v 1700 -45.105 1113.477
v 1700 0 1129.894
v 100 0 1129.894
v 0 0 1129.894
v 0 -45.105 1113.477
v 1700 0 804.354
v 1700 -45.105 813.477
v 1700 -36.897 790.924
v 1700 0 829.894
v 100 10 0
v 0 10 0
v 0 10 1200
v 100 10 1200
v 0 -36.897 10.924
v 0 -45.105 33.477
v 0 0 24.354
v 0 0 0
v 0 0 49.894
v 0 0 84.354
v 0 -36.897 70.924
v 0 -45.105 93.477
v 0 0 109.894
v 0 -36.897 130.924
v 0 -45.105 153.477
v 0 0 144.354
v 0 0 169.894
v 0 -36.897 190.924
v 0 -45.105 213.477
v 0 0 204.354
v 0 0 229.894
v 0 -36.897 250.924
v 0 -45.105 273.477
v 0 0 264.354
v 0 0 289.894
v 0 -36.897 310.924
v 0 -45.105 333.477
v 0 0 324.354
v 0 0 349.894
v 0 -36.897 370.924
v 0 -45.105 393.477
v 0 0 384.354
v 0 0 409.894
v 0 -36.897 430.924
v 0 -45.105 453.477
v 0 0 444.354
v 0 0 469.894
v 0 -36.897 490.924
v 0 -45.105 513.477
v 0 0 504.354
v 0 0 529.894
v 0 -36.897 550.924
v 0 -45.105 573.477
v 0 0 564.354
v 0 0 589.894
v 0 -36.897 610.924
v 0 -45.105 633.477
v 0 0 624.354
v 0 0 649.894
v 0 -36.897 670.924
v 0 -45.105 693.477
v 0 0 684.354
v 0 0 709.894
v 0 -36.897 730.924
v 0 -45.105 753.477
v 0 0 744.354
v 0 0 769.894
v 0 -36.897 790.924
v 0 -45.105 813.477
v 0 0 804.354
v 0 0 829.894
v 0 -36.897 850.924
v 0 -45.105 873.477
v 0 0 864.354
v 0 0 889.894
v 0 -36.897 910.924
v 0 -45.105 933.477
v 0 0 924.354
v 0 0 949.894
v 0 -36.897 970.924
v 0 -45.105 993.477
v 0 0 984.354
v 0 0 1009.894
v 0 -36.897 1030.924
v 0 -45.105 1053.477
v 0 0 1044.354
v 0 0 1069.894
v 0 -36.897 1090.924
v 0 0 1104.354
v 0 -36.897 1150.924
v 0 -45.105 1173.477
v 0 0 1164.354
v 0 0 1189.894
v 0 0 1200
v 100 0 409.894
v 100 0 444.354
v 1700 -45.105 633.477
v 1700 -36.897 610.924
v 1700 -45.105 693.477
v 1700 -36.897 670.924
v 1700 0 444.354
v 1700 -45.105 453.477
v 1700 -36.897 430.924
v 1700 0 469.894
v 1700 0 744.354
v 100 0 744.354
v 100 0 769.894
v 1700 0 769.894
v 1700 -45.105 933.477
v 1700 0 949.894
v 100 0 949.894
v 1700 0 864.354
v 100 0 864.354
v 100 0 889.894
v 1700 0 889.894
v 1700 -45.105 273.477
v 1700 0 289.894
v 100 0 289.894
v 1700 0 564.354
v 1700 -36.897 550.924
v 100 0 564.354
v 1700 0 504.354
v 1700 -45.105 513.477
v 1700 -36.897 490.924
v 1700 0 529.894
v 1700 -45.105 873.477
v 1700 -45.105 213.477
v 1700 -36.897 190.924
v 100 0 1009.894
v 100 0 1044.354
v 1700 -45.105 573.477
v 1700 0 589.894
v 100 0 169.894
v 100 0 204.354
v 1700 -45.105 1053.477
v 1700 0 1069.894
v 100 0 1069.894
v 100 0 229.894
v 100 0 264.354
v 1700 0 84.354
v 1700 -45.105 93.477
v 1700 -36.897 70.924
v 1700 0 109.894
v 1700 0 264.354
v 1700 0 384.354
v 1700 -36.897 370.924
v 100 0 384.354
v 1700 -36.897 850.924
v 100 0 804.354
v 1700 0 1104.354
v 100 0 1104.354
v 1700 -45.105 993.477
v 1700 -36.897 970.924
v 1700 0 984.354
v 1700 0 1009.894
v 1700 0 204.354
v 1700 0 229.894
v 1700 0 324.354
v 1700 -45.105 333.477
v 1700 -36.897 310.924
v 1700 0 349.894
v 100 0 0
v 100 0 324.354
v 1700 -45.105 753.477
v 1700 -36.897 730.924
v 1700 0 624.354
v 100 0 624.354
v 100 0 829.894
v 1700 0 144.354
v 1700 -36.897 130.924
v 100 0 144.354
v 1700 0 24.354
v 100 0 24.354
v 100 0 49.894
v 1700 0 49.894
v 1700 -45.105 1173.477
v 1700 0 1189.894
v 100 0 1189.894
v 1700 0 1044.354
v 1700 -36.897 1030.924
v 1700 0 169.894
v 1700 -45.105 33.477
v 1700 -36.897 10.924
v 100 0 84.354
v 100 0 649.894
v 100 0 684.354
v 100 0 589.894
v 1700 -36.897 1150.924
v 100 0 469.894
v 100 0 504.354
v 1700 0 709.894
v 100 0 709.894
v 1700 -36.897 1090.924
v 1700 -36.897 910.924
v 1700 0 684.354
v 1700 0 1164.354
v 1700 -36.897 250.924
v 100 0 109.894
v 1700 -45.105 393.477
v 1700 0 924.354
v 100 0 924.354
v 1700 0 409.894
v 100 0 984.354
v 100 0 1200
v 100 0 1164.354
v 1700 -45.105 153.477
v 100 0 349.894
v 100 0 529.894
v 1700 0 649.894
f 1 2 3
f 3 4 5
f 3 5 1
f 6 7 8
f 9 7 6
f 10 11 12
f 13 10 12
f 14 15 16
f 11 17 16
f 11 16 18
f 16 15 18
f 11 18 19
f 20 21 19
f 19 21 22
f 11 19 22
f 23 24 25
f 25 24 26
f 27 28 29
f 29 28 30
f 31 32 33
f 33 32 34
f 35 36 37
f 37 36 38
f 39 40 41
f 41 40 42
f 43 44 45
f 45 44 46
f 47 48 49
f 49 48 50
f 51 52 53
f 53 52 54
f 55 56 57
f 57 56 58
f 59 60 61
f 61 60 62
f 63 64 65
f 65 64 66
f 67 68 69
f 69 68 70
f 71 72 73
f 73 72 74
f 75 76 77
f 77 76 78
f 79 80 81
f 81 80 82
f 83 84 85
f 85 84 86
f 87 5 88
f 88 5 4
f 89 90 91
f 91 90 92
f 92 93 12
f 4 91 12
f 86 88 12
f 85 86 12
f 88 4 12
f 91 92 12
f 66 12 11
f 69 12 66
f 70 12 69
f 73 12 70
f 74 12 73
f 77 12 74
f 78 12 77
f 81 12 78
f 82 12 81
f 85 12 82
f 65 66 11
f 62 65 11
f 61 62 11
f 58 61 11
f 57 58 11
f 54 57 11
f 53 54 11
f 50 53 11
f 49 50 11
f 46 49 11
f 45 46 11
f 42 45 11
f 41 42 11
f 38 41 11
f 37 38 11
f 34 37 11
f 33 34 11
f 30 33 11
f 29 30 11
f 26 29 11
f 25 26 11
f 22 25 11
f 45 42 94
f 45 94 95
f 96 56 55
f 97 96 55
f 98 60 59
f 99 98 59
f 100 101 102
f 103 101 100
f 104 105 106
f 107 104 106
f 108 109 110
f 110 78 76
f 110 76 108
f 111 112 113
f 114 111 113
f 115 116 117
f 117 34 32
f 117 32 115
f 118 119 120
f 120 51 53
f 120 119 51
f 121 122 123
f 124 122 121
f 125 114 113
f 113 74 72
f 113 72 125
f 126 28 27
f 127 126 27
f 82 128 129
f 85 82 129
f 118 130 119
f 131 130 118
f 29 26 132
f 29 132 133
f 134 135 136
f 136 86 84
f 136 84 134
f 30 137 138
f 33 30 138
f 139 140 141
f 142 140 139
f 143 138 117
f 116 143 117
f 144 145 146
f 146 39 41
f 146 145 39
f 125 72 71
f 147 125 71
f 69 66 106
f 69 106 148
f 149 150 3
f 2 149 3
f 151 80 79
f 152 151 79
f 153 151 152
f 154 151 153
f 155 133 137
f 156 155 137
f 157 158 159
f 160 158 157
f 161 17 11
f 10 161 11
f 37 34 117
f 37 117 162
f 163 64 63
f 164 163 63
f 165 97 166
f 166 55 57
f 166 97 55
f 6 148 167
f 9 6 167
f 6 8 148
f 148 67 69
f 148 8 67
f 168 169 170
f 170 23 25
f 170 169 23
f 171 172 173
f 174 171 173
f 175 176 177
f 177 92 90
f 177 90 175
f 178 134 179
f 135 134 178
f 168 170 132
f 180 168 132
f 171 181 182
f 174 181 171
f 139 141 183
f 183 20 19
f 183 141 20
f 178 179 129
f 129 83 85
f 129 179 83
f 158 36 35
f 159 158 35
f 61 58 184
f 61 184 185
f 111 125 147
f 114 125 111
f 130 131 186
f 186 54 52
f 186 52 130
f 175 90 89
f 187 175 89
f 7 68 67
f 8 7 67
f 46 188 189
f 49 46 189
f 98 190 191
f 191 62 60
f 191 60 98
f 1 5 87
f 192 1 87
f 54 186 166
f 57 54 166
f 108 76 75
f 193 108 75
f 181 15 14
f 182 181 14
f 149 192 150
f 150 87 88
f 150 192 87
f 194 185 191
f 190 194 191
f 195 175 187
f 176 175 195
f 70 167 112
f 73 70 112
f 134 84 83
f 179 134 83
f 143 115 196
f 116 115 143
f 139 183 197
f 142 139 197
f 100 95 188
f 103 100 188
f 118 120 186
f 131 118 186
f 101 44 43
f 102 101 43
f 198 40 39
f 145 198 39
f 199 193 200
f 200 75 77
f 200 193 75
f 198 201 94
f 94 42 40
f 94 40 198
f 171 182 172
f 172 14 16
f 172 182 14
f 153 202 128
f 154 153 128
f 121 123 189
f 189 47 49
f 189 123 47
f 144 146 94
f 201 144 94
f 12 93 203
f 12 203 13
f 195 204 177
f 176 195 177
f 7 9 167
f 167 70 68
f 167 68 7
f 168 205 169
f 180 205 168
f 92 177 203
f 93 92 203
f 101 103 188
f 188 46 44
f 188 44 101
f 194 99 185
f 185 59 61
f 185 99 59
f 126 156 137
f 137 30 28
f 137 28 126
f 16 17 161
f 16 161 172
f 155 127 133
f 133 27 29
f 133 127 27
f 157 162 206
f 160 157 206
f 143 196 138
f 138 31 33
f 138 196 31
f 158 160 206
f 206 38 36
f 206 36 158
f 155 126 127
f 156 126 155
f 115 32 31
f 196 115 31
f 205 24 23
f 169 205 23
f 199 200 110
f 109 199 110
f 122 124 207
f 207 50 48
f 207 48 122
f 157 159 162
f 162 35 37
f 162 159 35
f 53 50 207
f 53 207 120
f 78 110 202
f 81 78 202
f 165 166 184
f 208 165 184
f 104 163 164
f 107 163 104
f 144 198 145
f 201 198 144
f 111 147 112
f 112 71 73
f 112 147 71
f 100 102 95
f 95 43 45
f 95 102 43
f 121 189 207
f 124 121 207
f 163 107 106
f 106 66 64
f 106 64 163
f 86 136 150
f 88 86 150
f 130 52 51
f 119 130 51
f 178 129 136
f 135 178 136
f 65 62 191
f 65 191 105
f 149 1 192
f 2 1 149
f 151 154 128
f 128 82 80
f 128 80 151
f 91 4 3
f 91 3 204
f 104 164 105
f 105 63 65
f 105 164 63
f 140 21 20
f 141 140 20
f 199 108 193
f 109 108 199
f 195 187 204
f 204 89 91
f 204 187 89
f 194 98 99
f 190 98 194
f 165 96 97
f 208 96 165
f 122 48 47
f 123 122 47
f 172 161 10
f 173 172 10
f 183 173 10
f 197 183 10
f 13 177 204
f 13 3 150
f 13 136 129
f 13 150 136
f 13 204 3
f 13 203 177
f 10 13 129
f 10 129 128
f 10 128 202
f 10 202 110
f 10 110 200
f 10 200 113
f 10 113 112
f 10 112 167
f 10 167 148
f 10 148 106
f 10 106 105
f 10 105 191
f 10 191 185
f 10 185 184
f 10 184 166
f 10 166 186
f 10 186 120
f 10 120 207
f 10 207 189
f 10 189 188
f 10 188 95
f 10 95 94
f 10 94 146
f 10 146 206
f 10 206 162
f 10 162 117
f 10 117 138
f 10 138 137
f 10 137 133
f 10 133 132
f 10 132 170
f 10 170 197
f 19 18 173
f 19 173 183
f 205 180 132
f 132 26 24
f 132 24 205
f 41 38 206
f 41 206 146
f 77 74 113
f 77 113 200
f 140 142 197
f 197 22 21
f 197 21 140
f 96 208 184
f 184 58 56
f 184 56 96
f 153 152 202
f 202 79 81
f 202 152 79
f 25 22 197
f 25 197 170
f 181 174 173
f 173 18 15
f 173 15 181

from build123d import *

# Parameters (mm, degrees)
F0_W     = 10
F0_H     = 1200
F1_DEPTH = 100
F3_DEPTH = 1700


with BuildPart() as f1:
    # F0 (on Right) → F1 (new body)
    with BuildSketch(Plane.YZ):
        with Locations((5, 600)):
            Rectangle(F0_W, F0_H)
    extrude(amount=F1_DEPTH)

    # F2 (on Right) → F3 (join)
    with BuildSketch(Plane.YZ):
        Polygon((0, 24.353822), (0, 49.894088), (-45.105246, 33.477121), (-36.896762, 10.924499), align=None)
        Polygon((-45.105245, 93.47712), (-36.896762, 70.924497), (1e-06, 84.35382), (1e-06, 109.894087), align=None)
        Polygon((-45.105244, 153.477119), (-36.896761, 130.924496), (2e-06, 144.353819), (2e-06, 169.894086), align=None)
        Polygon((-45.105243, 213.477117), (-36.89676, 190.924495), (3e-06, 204.353818), (3e-06, 229.894084), align=None)
        Polygon((-45.105242, 273.477116), (-36.896759, 250.924493), (3e-06, 264.353816), (3e-06, 289.894083), align=None)
        Polygon((-45.105241, 393.477113), (-36.896757, 370.924491), (5e-06, 384.353814), (5e-06, 409.89408), align=None)
        Polygon((-45.10524, 453.477112), (-36.896757, 430.924489), (6e-06, 444.353812), (6e-06, 469.894079), align=None)
        Polygon((-45.105242, 333.477115), (-36.896758, 310.924492), (4e-06, 324.353815), (4e-06, 349.894082), align=None)
        Polygon((-45.105239, 513.477111), (-36.896756, 490.924488), (7e-06, 504.353811), (7e-06, 529.894078), align=None)
        Polygon((-45.105237, 633.477108), (-36.896754, 610.924485), (8e-06, 624.353808), (8e-06, 649.894075), align=None)
        Polygon((-45.105238, 573.477109), (-36.896755, 550.924487), (8e-06, 564.35381), (8e-06, 589.894076), align=None)
        Polygon((-45.105237, 693.477107), (-36.896753, 670.924484), (9e-06, 684.353807), (9e-06, 709.894074), align=None)
        Polygon((-45.105236, 753.477105), (-36.896752, 730.924482), (1e-05, 744.353806), (1e-05, 769.894072), align=None)
        Polygon((-45.105233, 933.477101), (-36.89675, 910.924478), (1.3e-05, 924.353802), (1.3e-05, 949.894068), align=None)
        Polygon((-45.105235, 813.477104), (-36.896752, 790.924481), (1.1e-05, 804.353804), (1.1e-05, 829.894071), align=None)
        Polygon((-45.105234, 873.477103), (-36.896751, 850.92448), (1.2e-05, 864.353803), (1.2e-05, 889.89407), align=None)
        Polygon((-45.10523, 1173.477096), (-36.896747, 1150.924473), (1.6e-05, 1164.353796), (1.6e-05, 1189.894063), align=None)
        Polygon((-45.105231, 1113.477097), (-36.896747, 1090.924474), (1.5e-05, 1104.353798), (1.5e-05, 1129.894064), align=None)
        Polygon((-45.105232, 1053.477099), (-36.896748, 1030.924476), (1.4e-05, 1044.353799), (1.4e-05, 1069.894066), align=None)
        Polygon((-45.105232, 993.4771), (-36.896749, 970.924477), (1.3e-05, 984.3538), (1.3e-05, 1009.894067), align=None)
    extrude(amount=F3_DEPTH)


solid = f1.part
